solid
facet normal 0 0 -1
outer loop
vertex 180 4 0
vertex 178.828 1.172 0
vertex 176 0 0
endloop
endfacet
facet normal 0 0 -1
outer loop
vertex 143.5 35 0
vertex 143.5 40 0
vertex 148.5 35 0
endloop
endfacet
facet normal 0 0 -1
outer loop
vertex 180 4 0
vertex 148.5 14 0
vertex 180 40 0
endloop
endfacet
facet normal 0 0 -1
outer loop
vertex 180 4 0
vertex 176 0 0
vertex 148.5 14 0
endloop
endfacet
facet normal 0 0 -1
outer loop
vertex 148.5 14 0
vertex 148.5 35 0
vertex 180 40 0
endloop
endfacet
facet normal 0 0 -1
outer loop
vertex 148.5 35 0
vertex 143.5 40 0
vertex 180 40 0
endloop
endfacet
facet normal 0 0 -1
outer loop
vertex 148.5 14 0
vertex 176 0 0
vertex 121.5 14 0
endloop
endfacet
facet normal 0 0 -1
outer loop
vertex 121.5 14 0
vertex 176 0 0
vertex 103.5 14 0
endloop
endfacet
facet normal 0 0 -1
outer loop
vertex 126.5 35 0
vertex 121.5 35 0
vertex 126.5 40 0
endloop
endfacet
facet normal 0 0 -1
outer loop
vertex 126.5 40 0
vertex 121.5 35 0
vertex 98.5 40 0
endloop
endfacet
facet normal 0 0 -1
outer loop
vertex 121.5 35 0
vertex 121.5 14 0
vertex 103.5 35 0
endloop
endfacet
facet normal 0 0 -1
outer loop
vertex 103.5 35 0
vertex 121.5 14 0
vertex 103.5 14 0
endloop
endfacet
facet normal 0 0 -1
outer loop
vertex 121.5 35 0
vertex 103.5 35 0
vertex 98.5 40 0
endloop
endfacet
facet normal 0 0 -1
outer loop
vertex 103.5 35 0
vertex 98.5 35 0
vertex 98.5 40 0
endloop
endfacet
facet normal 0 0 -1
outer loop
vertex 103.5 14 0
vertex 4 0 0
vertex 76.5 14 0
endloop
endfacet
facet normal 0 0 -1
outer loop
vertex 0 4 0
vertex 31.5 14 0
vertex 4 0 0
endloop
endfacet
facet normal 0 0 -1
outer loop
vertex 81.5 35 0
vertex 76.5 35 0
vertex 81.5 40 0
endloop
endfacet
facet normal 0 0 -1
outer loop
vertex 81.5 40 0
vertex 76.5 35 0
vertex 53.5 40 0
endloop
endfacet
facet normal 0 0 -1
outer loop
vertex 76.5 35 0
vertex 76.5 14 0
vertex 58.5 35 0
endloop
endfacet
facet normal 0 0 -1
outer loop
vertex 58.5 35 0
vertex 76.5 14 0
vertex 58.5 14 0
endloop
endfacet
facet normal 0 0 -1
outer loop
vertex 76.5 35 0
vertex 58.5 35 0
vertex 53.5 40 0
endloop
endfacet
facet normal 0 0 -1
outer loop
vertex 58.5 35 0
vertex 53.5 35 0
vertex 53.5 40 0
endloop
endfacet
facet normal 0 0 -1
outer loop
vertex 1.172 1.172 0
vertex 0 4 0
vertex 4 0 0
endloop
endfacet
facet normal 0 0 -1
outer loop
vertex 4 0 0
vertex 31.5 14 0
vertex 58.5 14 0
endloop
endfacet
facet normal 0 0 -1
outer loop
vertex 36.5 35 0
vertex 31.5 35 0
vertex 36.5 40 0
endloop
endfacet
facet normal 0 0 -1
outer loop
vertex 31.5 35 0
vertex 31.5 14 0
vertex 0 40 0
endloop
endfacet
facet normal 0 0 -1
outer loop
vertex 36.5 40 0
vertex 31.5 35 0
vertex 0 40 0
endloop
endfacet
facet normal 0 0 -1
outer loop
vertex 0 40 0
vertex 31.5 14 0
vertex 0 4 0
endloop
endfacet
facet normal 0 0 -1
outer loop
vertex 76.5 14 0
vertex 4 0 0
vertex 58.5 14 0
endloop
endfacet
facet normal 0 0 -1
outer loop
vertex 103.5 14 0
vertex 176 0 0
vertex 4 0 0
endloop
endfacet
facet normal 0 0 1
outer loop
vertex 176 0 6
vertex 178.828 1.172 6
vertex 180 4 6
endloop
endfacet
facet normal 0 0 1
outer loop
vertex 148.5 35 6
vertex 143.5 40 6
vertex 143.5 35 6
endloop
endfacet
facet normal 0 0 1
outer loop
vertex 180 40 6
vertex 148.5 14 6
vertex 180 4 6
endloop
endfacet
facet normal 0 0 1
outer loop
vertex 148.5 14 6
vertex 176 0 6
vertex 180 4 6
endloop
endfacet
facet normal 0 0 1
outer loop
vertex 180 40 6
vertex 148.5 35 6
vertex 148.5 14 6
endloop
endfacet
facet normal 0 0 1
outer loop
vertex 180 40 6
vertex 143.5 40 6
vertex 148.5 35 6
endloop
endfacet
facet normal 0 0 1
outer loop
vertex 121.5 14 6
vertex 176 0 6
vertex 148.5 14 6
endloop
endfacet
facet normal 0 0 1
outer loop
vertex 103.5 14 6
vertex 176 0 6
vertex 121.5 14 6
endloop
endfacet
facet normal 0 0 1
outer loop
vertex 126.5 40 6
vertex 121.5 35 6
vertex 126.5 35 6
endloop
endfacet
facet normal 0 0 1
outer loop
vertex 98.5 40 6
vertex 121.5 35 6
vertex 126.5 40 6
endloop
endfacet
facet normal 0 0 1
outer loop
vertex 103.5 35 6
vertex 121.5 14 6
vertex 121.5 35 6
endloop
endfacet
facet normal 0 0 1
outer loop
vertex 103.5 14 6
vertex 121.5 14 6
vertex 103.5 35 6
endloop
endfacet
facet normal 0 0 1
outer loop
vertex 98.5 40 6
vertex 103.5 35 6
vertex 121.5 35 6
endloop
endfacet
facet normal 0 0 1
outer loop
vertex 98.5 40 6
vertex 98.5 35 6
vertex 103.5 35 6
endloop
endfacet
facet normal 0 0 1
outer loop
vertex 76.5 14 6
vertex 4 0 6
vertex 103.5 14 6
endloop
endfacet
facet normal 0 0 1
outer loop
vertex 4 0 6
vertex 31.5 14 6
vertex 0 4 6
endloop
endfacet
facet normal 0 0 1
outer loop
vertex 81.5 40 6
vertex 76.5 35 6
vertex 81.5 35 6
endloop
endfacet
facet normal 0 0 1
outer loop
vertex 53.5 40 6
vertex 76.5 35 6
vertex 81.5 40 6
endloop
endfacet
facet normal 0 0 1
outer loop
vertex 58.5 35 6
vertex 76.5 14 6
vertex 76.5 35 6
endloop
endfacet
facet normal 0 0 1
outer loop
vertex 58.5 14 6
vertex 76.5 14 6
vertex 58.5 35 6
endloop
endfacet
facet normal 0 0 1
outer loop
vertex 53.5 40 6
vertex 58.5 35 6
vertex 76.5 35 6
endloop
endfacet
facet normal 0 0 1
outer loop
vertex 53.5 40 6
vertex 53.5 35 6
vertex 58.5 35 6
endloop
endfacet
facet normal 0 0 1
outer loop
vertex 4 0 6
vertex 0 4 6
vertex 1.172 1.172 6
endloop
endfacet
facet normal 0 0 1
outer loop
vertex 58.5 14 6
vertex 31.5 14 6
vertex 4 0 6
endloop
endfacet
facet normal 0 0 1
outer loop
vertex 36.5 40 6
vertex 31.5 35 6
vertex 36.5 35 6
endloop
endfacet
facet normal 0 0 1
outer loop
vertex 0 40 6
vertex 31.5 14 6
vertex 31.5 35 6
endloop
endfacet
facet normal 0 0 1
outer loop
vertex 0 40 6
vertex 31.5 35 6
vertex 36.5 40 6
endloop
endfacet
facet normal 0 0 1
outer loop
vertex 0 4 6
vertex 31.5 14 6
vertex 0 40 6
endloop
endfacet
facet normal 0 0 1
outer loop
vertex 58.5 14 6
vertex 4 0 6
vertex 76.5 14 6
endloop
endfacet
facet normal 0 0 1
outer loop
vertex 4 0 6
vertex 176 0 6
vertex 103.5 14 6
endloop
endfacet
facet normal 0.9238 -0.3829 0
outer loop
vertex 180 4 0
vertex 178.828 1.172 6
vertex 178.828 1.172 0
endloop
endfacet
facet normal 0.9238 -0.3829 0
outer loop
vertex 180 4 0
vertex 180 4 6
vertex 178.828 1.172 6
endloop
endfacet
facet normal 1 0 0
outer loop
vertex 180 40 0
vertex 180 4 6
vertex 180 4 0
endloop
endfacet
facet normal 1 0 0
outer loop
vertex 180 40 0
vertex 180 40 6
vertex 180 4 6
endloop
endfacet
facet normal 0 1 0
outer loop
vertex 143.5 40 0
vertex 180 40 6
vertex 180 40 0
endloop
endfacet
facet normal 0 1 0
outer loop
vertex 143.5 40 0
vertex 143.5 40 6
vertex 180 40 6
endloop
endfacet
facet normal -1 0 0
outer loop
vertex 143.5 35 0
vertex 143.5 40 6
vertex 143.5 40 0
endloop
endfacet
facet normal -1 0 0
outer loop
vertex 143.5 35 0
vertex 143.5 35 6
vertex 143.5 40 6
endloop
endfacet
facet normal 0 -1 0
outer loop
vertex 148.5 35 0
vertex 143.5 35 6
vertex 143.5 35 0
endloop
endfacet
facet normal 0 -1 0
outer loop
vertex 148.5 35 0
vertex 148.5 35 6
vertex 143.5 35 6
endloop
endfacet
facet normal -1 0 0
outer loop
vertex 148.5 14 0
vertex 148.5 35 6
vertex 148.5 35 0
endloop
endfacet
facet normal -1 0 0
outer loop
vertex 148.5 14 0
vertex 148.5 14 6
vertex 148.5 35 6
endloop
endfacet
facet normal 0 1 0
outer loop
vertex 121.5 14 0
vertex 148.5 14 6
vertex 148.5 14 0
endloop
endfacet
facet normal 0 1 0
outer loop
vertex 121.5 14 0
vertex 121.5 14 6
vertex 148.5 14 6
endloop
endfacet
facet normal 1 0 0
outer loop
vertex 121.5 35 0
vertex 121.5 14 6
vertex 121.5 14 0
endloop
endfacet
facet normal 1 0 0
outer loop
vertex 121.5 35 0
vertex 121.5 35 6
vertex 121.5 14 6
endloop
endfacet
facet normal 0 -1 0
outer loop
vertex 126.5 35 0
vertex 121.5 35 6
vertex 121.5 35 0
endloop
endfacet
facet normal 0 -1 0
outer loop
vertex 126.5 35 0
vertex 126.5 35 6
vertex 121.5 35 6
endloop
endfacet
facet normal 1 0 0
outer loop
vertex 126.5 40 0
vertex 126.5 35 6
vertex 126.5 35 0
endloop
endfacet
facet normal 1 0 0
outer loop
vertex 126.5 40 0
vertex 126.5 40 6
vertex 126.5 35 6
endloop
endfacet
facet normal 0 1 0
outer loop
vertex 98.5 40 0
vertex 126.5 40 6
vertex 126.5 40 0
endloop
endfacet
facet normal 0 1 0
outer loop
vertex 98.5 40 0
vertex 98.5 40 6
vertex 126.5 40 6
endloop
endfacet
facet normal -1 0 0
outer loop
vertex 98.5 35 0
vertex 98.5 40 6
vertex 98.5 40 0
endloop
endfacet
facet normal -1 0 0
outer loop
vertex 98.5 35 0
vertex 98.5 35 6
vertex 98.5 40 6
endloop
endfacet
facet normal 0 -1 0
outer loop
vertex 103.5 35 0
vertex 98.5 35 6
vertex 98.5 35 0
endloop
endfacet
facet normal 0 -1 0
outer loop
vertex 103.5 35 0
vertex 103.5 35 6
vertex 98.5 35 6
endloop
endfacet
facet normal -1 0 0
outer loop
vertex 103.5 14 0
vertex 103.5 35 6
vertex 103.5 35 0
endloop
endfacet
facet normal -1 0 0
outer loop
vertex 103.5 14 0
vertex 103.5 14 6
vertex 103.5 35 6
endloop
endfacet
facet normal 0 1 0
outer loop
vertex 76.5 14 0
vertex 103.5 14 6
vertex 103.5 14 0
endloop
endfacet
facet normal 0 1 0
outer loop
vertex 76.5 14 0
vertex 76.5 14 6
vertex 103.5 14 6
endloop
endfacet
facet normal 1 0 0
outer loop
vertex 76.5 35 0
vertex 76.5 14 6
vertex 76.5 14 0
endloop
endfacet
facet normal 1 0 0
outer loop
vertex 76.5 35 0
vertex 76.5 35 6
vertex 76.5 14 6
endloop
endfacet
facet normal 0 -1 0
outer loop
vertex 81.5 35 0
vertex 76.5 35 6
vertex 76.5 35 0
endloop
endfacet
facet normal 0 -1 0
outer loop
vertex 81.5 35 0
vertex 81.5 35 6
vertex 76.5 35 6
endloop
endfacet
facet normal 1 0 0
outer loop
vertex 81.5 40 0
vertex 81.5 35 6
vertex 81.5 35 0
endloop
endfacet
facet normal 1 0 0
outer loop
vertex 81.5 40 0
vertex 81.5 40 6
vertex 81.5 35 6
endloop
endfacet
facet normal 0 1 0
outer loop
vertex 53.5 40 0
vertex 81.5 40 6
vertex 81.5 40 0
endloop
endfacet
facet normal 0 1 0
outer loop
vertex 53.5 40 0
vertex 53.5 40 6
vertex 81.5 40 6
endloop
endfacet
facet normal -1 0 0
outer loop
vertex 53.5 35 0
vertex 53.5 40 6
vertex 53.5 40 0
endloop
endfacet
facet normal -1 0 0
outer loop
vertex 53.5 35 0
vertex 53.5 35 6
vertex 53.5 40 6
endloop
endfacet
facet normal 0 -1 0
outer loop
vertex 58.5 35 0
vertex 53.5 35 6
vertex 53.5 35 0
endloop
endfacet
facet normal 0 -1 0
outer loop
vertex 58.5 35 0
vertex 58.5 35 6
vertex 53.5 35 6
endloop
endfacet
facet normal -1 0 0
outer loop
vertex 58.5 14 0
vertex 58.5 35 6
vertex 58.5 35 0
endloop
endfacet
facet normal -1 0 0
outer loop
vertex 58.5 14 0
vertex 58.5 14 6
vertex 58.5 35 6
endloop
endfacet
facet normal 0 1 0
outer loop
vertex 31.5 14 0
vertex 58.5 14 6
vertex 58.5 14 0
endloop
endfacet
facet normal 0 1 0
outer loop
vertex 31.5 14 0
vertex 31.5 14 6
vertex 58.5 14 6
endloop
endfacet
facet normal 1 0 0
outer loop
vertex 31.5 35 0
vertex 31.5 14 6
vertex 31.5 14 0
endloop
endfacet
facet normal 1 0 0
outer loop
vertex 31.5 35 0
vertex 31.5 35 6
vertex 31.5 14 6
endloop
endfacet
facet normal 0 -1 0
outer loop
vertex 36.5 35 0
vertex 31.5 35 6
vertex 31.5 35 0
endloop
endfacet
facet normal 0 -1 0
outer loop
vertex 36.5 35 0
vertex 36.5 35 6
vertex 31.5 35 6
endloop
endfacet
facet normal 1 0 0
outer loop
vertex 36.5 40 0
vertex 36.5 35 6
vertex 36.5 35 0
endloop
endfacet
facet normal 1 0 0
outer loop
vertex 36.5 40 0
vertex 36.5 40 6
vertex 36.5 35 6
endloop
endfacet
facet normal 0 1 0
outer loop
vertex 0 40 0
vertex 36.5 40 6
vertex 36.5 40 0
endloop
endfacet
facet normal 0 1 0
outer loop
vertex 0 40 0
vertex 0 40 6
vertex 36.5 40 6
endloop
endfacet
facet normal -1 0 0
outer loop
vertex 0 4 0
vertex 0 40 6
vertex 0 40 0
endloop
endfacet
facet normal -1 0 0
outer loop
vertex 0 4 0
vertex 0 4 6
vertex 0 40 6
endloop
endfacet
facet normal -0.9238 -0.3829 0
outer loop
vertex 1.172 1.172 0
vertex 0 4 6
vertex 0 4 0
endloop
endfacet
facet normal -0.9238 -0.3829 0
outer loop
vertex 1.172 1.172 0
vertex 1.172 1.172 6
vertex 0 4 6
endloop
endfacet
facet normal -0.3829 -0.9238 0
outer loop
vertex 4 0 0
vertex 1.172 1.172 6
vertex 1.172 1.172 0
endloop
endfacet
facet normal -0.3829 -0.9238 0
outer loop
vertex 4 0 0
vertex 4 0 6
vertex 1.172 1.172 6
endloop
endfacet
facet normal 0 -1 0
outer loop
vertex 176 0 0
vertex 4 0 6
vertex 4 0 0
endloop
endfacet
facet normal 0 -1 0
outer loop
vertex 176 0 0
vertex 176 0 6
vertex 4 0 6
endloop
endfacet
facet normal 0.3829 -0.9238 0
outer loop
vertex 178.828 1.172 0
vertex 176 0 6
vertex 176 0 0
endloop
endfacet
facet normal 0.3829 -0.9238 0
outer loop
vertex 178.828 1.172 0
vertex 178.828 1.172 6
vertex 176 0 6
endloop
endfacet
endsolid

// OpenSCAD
$fn = 32;

// ----------------------------------------------------------------------
// Oversize slot bar: 180 mm bar with 3 oversize windows
// ----------------------------------------------------------------------

// --- parameters (mm) ---
profile_height = 6;       // extrusion height
profile_points = 32;      // points of the closed outline

profile = [[0, 4], [1.172, 1.172], [4, 0], [176, 0], [178.828, 1.172], [180, 4], [180, 40], [143.5, 40], [143.5, 35], [148.5, 35], [148.5, 14], [121.5, 14], [121.5, 35], [126.5, 35], [126.5, 40], [98.5, 40], [98.5, 35], [103.5, 35], [103.5, 14], [76.5, 14], [76.5, 35], [81.5, 35], [81.5, 40], [53.5, 40], [53.5, 35], [58.5, 35], [58.5, 14], [31.5, 14], [31.5, 35], [36.5, 35], [36.5, 40], [0, 40]];  // single closed polygon, 32 points, counter clockwise

// --- the one profile operation ---
linear_extrude(height = profile_height) polygon(points = profile);
